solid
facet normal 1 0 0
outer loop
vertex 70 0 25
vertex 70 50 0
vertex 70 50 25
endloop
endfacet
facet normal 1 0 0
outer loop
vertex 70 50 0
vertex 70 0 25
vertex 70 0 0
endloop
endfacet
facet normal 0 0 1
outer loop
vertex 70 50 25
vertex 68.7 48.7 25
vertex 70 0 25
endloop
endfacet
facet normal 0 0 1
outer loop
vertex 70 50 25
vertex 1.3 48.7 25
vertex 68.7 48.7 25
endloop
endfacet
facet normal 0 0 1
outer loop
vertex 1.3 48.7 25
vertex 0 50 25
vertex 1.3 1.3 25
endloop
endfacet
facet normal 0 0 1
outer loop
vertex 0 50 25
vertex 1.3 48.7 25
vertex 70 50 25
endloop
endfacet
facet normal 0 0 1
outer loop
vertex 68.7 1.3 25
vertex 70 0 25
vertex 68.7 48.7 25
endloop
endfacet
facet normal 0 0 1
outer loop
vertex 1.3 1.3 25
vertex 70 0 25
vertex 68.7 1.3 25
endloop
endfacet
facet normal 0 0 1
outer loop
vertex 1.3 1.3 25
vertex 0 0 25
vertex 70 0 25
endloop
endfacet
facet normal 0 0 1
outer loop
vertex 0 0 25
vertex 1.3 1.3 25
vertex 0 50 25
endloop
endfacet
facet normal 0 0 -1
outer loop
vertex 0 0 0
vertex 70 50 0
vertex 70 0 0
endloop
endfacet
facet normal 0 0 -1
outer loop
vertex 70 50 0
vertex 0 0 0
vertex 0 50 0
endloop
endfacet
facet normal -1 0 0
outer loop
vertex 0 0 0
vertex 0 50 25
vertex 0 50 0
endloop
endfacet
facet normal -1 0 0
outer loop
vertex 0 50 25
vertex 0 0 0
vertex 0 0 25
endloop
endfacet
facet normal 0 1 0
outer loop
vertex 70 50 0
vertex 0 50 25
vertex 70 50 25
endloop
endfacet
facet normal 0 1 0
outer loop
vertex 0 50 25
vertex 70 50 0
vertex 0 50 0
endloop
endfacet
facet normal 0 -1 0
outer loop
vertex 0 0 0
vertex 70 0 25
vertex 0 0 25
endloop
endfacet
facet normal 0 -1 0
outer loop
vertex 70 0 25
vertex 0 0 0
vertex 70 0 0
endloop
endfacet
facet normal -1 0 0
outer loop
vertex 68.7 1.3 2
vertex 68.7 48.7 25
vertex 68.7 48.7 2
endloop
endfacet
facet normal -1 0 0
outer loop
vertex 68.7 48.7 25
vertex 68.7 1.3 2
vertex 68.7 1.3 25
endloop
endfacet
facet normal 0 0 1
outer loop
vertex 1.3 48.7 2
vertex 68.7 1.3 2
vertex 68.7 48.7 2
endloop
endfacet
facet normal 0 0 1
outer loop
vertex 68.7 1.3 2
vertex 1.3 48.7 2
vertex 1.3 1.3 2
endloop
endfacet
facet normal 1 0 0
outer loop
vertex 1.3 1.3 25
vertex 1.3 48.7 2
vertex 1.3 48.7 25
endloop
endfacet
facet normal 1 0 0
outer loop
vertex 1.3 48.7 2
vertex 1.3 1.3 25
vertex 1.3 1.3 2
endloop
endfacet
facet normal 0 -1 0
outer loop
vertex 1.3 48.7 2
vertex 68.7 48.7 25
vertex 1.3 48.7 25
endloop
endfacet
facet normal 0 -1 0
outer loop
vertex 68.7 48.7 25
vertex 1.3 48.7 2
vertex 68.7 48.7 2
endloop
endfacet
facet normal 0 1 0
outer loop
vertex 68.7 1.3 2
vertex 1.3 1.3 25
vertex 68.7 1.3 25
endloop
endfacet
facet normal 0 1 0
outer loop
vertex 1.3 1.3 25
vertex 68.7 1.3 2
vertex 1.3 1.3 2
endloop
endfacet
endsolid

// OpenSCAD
$fn = 32;

// ----------------------------------------------------------------------
// Open box: 1.3 mm walls
// ----------------------------------------------------------------------

// --- parameters (mm) ---
box_l = 70;               // outer length, X
box_w = 50;               // outer width, Y
box_h = 25;               // outer height, Z
wall = 1.3;               // wall thickness
floor = 2;                // floor thickness

difference() {
  cube([box_l, box_w, box_h]);
  translate([wall, wall, floor])
    cube([box_l - 2 * wall, box_w - 2 * wall, box_h]);
}
